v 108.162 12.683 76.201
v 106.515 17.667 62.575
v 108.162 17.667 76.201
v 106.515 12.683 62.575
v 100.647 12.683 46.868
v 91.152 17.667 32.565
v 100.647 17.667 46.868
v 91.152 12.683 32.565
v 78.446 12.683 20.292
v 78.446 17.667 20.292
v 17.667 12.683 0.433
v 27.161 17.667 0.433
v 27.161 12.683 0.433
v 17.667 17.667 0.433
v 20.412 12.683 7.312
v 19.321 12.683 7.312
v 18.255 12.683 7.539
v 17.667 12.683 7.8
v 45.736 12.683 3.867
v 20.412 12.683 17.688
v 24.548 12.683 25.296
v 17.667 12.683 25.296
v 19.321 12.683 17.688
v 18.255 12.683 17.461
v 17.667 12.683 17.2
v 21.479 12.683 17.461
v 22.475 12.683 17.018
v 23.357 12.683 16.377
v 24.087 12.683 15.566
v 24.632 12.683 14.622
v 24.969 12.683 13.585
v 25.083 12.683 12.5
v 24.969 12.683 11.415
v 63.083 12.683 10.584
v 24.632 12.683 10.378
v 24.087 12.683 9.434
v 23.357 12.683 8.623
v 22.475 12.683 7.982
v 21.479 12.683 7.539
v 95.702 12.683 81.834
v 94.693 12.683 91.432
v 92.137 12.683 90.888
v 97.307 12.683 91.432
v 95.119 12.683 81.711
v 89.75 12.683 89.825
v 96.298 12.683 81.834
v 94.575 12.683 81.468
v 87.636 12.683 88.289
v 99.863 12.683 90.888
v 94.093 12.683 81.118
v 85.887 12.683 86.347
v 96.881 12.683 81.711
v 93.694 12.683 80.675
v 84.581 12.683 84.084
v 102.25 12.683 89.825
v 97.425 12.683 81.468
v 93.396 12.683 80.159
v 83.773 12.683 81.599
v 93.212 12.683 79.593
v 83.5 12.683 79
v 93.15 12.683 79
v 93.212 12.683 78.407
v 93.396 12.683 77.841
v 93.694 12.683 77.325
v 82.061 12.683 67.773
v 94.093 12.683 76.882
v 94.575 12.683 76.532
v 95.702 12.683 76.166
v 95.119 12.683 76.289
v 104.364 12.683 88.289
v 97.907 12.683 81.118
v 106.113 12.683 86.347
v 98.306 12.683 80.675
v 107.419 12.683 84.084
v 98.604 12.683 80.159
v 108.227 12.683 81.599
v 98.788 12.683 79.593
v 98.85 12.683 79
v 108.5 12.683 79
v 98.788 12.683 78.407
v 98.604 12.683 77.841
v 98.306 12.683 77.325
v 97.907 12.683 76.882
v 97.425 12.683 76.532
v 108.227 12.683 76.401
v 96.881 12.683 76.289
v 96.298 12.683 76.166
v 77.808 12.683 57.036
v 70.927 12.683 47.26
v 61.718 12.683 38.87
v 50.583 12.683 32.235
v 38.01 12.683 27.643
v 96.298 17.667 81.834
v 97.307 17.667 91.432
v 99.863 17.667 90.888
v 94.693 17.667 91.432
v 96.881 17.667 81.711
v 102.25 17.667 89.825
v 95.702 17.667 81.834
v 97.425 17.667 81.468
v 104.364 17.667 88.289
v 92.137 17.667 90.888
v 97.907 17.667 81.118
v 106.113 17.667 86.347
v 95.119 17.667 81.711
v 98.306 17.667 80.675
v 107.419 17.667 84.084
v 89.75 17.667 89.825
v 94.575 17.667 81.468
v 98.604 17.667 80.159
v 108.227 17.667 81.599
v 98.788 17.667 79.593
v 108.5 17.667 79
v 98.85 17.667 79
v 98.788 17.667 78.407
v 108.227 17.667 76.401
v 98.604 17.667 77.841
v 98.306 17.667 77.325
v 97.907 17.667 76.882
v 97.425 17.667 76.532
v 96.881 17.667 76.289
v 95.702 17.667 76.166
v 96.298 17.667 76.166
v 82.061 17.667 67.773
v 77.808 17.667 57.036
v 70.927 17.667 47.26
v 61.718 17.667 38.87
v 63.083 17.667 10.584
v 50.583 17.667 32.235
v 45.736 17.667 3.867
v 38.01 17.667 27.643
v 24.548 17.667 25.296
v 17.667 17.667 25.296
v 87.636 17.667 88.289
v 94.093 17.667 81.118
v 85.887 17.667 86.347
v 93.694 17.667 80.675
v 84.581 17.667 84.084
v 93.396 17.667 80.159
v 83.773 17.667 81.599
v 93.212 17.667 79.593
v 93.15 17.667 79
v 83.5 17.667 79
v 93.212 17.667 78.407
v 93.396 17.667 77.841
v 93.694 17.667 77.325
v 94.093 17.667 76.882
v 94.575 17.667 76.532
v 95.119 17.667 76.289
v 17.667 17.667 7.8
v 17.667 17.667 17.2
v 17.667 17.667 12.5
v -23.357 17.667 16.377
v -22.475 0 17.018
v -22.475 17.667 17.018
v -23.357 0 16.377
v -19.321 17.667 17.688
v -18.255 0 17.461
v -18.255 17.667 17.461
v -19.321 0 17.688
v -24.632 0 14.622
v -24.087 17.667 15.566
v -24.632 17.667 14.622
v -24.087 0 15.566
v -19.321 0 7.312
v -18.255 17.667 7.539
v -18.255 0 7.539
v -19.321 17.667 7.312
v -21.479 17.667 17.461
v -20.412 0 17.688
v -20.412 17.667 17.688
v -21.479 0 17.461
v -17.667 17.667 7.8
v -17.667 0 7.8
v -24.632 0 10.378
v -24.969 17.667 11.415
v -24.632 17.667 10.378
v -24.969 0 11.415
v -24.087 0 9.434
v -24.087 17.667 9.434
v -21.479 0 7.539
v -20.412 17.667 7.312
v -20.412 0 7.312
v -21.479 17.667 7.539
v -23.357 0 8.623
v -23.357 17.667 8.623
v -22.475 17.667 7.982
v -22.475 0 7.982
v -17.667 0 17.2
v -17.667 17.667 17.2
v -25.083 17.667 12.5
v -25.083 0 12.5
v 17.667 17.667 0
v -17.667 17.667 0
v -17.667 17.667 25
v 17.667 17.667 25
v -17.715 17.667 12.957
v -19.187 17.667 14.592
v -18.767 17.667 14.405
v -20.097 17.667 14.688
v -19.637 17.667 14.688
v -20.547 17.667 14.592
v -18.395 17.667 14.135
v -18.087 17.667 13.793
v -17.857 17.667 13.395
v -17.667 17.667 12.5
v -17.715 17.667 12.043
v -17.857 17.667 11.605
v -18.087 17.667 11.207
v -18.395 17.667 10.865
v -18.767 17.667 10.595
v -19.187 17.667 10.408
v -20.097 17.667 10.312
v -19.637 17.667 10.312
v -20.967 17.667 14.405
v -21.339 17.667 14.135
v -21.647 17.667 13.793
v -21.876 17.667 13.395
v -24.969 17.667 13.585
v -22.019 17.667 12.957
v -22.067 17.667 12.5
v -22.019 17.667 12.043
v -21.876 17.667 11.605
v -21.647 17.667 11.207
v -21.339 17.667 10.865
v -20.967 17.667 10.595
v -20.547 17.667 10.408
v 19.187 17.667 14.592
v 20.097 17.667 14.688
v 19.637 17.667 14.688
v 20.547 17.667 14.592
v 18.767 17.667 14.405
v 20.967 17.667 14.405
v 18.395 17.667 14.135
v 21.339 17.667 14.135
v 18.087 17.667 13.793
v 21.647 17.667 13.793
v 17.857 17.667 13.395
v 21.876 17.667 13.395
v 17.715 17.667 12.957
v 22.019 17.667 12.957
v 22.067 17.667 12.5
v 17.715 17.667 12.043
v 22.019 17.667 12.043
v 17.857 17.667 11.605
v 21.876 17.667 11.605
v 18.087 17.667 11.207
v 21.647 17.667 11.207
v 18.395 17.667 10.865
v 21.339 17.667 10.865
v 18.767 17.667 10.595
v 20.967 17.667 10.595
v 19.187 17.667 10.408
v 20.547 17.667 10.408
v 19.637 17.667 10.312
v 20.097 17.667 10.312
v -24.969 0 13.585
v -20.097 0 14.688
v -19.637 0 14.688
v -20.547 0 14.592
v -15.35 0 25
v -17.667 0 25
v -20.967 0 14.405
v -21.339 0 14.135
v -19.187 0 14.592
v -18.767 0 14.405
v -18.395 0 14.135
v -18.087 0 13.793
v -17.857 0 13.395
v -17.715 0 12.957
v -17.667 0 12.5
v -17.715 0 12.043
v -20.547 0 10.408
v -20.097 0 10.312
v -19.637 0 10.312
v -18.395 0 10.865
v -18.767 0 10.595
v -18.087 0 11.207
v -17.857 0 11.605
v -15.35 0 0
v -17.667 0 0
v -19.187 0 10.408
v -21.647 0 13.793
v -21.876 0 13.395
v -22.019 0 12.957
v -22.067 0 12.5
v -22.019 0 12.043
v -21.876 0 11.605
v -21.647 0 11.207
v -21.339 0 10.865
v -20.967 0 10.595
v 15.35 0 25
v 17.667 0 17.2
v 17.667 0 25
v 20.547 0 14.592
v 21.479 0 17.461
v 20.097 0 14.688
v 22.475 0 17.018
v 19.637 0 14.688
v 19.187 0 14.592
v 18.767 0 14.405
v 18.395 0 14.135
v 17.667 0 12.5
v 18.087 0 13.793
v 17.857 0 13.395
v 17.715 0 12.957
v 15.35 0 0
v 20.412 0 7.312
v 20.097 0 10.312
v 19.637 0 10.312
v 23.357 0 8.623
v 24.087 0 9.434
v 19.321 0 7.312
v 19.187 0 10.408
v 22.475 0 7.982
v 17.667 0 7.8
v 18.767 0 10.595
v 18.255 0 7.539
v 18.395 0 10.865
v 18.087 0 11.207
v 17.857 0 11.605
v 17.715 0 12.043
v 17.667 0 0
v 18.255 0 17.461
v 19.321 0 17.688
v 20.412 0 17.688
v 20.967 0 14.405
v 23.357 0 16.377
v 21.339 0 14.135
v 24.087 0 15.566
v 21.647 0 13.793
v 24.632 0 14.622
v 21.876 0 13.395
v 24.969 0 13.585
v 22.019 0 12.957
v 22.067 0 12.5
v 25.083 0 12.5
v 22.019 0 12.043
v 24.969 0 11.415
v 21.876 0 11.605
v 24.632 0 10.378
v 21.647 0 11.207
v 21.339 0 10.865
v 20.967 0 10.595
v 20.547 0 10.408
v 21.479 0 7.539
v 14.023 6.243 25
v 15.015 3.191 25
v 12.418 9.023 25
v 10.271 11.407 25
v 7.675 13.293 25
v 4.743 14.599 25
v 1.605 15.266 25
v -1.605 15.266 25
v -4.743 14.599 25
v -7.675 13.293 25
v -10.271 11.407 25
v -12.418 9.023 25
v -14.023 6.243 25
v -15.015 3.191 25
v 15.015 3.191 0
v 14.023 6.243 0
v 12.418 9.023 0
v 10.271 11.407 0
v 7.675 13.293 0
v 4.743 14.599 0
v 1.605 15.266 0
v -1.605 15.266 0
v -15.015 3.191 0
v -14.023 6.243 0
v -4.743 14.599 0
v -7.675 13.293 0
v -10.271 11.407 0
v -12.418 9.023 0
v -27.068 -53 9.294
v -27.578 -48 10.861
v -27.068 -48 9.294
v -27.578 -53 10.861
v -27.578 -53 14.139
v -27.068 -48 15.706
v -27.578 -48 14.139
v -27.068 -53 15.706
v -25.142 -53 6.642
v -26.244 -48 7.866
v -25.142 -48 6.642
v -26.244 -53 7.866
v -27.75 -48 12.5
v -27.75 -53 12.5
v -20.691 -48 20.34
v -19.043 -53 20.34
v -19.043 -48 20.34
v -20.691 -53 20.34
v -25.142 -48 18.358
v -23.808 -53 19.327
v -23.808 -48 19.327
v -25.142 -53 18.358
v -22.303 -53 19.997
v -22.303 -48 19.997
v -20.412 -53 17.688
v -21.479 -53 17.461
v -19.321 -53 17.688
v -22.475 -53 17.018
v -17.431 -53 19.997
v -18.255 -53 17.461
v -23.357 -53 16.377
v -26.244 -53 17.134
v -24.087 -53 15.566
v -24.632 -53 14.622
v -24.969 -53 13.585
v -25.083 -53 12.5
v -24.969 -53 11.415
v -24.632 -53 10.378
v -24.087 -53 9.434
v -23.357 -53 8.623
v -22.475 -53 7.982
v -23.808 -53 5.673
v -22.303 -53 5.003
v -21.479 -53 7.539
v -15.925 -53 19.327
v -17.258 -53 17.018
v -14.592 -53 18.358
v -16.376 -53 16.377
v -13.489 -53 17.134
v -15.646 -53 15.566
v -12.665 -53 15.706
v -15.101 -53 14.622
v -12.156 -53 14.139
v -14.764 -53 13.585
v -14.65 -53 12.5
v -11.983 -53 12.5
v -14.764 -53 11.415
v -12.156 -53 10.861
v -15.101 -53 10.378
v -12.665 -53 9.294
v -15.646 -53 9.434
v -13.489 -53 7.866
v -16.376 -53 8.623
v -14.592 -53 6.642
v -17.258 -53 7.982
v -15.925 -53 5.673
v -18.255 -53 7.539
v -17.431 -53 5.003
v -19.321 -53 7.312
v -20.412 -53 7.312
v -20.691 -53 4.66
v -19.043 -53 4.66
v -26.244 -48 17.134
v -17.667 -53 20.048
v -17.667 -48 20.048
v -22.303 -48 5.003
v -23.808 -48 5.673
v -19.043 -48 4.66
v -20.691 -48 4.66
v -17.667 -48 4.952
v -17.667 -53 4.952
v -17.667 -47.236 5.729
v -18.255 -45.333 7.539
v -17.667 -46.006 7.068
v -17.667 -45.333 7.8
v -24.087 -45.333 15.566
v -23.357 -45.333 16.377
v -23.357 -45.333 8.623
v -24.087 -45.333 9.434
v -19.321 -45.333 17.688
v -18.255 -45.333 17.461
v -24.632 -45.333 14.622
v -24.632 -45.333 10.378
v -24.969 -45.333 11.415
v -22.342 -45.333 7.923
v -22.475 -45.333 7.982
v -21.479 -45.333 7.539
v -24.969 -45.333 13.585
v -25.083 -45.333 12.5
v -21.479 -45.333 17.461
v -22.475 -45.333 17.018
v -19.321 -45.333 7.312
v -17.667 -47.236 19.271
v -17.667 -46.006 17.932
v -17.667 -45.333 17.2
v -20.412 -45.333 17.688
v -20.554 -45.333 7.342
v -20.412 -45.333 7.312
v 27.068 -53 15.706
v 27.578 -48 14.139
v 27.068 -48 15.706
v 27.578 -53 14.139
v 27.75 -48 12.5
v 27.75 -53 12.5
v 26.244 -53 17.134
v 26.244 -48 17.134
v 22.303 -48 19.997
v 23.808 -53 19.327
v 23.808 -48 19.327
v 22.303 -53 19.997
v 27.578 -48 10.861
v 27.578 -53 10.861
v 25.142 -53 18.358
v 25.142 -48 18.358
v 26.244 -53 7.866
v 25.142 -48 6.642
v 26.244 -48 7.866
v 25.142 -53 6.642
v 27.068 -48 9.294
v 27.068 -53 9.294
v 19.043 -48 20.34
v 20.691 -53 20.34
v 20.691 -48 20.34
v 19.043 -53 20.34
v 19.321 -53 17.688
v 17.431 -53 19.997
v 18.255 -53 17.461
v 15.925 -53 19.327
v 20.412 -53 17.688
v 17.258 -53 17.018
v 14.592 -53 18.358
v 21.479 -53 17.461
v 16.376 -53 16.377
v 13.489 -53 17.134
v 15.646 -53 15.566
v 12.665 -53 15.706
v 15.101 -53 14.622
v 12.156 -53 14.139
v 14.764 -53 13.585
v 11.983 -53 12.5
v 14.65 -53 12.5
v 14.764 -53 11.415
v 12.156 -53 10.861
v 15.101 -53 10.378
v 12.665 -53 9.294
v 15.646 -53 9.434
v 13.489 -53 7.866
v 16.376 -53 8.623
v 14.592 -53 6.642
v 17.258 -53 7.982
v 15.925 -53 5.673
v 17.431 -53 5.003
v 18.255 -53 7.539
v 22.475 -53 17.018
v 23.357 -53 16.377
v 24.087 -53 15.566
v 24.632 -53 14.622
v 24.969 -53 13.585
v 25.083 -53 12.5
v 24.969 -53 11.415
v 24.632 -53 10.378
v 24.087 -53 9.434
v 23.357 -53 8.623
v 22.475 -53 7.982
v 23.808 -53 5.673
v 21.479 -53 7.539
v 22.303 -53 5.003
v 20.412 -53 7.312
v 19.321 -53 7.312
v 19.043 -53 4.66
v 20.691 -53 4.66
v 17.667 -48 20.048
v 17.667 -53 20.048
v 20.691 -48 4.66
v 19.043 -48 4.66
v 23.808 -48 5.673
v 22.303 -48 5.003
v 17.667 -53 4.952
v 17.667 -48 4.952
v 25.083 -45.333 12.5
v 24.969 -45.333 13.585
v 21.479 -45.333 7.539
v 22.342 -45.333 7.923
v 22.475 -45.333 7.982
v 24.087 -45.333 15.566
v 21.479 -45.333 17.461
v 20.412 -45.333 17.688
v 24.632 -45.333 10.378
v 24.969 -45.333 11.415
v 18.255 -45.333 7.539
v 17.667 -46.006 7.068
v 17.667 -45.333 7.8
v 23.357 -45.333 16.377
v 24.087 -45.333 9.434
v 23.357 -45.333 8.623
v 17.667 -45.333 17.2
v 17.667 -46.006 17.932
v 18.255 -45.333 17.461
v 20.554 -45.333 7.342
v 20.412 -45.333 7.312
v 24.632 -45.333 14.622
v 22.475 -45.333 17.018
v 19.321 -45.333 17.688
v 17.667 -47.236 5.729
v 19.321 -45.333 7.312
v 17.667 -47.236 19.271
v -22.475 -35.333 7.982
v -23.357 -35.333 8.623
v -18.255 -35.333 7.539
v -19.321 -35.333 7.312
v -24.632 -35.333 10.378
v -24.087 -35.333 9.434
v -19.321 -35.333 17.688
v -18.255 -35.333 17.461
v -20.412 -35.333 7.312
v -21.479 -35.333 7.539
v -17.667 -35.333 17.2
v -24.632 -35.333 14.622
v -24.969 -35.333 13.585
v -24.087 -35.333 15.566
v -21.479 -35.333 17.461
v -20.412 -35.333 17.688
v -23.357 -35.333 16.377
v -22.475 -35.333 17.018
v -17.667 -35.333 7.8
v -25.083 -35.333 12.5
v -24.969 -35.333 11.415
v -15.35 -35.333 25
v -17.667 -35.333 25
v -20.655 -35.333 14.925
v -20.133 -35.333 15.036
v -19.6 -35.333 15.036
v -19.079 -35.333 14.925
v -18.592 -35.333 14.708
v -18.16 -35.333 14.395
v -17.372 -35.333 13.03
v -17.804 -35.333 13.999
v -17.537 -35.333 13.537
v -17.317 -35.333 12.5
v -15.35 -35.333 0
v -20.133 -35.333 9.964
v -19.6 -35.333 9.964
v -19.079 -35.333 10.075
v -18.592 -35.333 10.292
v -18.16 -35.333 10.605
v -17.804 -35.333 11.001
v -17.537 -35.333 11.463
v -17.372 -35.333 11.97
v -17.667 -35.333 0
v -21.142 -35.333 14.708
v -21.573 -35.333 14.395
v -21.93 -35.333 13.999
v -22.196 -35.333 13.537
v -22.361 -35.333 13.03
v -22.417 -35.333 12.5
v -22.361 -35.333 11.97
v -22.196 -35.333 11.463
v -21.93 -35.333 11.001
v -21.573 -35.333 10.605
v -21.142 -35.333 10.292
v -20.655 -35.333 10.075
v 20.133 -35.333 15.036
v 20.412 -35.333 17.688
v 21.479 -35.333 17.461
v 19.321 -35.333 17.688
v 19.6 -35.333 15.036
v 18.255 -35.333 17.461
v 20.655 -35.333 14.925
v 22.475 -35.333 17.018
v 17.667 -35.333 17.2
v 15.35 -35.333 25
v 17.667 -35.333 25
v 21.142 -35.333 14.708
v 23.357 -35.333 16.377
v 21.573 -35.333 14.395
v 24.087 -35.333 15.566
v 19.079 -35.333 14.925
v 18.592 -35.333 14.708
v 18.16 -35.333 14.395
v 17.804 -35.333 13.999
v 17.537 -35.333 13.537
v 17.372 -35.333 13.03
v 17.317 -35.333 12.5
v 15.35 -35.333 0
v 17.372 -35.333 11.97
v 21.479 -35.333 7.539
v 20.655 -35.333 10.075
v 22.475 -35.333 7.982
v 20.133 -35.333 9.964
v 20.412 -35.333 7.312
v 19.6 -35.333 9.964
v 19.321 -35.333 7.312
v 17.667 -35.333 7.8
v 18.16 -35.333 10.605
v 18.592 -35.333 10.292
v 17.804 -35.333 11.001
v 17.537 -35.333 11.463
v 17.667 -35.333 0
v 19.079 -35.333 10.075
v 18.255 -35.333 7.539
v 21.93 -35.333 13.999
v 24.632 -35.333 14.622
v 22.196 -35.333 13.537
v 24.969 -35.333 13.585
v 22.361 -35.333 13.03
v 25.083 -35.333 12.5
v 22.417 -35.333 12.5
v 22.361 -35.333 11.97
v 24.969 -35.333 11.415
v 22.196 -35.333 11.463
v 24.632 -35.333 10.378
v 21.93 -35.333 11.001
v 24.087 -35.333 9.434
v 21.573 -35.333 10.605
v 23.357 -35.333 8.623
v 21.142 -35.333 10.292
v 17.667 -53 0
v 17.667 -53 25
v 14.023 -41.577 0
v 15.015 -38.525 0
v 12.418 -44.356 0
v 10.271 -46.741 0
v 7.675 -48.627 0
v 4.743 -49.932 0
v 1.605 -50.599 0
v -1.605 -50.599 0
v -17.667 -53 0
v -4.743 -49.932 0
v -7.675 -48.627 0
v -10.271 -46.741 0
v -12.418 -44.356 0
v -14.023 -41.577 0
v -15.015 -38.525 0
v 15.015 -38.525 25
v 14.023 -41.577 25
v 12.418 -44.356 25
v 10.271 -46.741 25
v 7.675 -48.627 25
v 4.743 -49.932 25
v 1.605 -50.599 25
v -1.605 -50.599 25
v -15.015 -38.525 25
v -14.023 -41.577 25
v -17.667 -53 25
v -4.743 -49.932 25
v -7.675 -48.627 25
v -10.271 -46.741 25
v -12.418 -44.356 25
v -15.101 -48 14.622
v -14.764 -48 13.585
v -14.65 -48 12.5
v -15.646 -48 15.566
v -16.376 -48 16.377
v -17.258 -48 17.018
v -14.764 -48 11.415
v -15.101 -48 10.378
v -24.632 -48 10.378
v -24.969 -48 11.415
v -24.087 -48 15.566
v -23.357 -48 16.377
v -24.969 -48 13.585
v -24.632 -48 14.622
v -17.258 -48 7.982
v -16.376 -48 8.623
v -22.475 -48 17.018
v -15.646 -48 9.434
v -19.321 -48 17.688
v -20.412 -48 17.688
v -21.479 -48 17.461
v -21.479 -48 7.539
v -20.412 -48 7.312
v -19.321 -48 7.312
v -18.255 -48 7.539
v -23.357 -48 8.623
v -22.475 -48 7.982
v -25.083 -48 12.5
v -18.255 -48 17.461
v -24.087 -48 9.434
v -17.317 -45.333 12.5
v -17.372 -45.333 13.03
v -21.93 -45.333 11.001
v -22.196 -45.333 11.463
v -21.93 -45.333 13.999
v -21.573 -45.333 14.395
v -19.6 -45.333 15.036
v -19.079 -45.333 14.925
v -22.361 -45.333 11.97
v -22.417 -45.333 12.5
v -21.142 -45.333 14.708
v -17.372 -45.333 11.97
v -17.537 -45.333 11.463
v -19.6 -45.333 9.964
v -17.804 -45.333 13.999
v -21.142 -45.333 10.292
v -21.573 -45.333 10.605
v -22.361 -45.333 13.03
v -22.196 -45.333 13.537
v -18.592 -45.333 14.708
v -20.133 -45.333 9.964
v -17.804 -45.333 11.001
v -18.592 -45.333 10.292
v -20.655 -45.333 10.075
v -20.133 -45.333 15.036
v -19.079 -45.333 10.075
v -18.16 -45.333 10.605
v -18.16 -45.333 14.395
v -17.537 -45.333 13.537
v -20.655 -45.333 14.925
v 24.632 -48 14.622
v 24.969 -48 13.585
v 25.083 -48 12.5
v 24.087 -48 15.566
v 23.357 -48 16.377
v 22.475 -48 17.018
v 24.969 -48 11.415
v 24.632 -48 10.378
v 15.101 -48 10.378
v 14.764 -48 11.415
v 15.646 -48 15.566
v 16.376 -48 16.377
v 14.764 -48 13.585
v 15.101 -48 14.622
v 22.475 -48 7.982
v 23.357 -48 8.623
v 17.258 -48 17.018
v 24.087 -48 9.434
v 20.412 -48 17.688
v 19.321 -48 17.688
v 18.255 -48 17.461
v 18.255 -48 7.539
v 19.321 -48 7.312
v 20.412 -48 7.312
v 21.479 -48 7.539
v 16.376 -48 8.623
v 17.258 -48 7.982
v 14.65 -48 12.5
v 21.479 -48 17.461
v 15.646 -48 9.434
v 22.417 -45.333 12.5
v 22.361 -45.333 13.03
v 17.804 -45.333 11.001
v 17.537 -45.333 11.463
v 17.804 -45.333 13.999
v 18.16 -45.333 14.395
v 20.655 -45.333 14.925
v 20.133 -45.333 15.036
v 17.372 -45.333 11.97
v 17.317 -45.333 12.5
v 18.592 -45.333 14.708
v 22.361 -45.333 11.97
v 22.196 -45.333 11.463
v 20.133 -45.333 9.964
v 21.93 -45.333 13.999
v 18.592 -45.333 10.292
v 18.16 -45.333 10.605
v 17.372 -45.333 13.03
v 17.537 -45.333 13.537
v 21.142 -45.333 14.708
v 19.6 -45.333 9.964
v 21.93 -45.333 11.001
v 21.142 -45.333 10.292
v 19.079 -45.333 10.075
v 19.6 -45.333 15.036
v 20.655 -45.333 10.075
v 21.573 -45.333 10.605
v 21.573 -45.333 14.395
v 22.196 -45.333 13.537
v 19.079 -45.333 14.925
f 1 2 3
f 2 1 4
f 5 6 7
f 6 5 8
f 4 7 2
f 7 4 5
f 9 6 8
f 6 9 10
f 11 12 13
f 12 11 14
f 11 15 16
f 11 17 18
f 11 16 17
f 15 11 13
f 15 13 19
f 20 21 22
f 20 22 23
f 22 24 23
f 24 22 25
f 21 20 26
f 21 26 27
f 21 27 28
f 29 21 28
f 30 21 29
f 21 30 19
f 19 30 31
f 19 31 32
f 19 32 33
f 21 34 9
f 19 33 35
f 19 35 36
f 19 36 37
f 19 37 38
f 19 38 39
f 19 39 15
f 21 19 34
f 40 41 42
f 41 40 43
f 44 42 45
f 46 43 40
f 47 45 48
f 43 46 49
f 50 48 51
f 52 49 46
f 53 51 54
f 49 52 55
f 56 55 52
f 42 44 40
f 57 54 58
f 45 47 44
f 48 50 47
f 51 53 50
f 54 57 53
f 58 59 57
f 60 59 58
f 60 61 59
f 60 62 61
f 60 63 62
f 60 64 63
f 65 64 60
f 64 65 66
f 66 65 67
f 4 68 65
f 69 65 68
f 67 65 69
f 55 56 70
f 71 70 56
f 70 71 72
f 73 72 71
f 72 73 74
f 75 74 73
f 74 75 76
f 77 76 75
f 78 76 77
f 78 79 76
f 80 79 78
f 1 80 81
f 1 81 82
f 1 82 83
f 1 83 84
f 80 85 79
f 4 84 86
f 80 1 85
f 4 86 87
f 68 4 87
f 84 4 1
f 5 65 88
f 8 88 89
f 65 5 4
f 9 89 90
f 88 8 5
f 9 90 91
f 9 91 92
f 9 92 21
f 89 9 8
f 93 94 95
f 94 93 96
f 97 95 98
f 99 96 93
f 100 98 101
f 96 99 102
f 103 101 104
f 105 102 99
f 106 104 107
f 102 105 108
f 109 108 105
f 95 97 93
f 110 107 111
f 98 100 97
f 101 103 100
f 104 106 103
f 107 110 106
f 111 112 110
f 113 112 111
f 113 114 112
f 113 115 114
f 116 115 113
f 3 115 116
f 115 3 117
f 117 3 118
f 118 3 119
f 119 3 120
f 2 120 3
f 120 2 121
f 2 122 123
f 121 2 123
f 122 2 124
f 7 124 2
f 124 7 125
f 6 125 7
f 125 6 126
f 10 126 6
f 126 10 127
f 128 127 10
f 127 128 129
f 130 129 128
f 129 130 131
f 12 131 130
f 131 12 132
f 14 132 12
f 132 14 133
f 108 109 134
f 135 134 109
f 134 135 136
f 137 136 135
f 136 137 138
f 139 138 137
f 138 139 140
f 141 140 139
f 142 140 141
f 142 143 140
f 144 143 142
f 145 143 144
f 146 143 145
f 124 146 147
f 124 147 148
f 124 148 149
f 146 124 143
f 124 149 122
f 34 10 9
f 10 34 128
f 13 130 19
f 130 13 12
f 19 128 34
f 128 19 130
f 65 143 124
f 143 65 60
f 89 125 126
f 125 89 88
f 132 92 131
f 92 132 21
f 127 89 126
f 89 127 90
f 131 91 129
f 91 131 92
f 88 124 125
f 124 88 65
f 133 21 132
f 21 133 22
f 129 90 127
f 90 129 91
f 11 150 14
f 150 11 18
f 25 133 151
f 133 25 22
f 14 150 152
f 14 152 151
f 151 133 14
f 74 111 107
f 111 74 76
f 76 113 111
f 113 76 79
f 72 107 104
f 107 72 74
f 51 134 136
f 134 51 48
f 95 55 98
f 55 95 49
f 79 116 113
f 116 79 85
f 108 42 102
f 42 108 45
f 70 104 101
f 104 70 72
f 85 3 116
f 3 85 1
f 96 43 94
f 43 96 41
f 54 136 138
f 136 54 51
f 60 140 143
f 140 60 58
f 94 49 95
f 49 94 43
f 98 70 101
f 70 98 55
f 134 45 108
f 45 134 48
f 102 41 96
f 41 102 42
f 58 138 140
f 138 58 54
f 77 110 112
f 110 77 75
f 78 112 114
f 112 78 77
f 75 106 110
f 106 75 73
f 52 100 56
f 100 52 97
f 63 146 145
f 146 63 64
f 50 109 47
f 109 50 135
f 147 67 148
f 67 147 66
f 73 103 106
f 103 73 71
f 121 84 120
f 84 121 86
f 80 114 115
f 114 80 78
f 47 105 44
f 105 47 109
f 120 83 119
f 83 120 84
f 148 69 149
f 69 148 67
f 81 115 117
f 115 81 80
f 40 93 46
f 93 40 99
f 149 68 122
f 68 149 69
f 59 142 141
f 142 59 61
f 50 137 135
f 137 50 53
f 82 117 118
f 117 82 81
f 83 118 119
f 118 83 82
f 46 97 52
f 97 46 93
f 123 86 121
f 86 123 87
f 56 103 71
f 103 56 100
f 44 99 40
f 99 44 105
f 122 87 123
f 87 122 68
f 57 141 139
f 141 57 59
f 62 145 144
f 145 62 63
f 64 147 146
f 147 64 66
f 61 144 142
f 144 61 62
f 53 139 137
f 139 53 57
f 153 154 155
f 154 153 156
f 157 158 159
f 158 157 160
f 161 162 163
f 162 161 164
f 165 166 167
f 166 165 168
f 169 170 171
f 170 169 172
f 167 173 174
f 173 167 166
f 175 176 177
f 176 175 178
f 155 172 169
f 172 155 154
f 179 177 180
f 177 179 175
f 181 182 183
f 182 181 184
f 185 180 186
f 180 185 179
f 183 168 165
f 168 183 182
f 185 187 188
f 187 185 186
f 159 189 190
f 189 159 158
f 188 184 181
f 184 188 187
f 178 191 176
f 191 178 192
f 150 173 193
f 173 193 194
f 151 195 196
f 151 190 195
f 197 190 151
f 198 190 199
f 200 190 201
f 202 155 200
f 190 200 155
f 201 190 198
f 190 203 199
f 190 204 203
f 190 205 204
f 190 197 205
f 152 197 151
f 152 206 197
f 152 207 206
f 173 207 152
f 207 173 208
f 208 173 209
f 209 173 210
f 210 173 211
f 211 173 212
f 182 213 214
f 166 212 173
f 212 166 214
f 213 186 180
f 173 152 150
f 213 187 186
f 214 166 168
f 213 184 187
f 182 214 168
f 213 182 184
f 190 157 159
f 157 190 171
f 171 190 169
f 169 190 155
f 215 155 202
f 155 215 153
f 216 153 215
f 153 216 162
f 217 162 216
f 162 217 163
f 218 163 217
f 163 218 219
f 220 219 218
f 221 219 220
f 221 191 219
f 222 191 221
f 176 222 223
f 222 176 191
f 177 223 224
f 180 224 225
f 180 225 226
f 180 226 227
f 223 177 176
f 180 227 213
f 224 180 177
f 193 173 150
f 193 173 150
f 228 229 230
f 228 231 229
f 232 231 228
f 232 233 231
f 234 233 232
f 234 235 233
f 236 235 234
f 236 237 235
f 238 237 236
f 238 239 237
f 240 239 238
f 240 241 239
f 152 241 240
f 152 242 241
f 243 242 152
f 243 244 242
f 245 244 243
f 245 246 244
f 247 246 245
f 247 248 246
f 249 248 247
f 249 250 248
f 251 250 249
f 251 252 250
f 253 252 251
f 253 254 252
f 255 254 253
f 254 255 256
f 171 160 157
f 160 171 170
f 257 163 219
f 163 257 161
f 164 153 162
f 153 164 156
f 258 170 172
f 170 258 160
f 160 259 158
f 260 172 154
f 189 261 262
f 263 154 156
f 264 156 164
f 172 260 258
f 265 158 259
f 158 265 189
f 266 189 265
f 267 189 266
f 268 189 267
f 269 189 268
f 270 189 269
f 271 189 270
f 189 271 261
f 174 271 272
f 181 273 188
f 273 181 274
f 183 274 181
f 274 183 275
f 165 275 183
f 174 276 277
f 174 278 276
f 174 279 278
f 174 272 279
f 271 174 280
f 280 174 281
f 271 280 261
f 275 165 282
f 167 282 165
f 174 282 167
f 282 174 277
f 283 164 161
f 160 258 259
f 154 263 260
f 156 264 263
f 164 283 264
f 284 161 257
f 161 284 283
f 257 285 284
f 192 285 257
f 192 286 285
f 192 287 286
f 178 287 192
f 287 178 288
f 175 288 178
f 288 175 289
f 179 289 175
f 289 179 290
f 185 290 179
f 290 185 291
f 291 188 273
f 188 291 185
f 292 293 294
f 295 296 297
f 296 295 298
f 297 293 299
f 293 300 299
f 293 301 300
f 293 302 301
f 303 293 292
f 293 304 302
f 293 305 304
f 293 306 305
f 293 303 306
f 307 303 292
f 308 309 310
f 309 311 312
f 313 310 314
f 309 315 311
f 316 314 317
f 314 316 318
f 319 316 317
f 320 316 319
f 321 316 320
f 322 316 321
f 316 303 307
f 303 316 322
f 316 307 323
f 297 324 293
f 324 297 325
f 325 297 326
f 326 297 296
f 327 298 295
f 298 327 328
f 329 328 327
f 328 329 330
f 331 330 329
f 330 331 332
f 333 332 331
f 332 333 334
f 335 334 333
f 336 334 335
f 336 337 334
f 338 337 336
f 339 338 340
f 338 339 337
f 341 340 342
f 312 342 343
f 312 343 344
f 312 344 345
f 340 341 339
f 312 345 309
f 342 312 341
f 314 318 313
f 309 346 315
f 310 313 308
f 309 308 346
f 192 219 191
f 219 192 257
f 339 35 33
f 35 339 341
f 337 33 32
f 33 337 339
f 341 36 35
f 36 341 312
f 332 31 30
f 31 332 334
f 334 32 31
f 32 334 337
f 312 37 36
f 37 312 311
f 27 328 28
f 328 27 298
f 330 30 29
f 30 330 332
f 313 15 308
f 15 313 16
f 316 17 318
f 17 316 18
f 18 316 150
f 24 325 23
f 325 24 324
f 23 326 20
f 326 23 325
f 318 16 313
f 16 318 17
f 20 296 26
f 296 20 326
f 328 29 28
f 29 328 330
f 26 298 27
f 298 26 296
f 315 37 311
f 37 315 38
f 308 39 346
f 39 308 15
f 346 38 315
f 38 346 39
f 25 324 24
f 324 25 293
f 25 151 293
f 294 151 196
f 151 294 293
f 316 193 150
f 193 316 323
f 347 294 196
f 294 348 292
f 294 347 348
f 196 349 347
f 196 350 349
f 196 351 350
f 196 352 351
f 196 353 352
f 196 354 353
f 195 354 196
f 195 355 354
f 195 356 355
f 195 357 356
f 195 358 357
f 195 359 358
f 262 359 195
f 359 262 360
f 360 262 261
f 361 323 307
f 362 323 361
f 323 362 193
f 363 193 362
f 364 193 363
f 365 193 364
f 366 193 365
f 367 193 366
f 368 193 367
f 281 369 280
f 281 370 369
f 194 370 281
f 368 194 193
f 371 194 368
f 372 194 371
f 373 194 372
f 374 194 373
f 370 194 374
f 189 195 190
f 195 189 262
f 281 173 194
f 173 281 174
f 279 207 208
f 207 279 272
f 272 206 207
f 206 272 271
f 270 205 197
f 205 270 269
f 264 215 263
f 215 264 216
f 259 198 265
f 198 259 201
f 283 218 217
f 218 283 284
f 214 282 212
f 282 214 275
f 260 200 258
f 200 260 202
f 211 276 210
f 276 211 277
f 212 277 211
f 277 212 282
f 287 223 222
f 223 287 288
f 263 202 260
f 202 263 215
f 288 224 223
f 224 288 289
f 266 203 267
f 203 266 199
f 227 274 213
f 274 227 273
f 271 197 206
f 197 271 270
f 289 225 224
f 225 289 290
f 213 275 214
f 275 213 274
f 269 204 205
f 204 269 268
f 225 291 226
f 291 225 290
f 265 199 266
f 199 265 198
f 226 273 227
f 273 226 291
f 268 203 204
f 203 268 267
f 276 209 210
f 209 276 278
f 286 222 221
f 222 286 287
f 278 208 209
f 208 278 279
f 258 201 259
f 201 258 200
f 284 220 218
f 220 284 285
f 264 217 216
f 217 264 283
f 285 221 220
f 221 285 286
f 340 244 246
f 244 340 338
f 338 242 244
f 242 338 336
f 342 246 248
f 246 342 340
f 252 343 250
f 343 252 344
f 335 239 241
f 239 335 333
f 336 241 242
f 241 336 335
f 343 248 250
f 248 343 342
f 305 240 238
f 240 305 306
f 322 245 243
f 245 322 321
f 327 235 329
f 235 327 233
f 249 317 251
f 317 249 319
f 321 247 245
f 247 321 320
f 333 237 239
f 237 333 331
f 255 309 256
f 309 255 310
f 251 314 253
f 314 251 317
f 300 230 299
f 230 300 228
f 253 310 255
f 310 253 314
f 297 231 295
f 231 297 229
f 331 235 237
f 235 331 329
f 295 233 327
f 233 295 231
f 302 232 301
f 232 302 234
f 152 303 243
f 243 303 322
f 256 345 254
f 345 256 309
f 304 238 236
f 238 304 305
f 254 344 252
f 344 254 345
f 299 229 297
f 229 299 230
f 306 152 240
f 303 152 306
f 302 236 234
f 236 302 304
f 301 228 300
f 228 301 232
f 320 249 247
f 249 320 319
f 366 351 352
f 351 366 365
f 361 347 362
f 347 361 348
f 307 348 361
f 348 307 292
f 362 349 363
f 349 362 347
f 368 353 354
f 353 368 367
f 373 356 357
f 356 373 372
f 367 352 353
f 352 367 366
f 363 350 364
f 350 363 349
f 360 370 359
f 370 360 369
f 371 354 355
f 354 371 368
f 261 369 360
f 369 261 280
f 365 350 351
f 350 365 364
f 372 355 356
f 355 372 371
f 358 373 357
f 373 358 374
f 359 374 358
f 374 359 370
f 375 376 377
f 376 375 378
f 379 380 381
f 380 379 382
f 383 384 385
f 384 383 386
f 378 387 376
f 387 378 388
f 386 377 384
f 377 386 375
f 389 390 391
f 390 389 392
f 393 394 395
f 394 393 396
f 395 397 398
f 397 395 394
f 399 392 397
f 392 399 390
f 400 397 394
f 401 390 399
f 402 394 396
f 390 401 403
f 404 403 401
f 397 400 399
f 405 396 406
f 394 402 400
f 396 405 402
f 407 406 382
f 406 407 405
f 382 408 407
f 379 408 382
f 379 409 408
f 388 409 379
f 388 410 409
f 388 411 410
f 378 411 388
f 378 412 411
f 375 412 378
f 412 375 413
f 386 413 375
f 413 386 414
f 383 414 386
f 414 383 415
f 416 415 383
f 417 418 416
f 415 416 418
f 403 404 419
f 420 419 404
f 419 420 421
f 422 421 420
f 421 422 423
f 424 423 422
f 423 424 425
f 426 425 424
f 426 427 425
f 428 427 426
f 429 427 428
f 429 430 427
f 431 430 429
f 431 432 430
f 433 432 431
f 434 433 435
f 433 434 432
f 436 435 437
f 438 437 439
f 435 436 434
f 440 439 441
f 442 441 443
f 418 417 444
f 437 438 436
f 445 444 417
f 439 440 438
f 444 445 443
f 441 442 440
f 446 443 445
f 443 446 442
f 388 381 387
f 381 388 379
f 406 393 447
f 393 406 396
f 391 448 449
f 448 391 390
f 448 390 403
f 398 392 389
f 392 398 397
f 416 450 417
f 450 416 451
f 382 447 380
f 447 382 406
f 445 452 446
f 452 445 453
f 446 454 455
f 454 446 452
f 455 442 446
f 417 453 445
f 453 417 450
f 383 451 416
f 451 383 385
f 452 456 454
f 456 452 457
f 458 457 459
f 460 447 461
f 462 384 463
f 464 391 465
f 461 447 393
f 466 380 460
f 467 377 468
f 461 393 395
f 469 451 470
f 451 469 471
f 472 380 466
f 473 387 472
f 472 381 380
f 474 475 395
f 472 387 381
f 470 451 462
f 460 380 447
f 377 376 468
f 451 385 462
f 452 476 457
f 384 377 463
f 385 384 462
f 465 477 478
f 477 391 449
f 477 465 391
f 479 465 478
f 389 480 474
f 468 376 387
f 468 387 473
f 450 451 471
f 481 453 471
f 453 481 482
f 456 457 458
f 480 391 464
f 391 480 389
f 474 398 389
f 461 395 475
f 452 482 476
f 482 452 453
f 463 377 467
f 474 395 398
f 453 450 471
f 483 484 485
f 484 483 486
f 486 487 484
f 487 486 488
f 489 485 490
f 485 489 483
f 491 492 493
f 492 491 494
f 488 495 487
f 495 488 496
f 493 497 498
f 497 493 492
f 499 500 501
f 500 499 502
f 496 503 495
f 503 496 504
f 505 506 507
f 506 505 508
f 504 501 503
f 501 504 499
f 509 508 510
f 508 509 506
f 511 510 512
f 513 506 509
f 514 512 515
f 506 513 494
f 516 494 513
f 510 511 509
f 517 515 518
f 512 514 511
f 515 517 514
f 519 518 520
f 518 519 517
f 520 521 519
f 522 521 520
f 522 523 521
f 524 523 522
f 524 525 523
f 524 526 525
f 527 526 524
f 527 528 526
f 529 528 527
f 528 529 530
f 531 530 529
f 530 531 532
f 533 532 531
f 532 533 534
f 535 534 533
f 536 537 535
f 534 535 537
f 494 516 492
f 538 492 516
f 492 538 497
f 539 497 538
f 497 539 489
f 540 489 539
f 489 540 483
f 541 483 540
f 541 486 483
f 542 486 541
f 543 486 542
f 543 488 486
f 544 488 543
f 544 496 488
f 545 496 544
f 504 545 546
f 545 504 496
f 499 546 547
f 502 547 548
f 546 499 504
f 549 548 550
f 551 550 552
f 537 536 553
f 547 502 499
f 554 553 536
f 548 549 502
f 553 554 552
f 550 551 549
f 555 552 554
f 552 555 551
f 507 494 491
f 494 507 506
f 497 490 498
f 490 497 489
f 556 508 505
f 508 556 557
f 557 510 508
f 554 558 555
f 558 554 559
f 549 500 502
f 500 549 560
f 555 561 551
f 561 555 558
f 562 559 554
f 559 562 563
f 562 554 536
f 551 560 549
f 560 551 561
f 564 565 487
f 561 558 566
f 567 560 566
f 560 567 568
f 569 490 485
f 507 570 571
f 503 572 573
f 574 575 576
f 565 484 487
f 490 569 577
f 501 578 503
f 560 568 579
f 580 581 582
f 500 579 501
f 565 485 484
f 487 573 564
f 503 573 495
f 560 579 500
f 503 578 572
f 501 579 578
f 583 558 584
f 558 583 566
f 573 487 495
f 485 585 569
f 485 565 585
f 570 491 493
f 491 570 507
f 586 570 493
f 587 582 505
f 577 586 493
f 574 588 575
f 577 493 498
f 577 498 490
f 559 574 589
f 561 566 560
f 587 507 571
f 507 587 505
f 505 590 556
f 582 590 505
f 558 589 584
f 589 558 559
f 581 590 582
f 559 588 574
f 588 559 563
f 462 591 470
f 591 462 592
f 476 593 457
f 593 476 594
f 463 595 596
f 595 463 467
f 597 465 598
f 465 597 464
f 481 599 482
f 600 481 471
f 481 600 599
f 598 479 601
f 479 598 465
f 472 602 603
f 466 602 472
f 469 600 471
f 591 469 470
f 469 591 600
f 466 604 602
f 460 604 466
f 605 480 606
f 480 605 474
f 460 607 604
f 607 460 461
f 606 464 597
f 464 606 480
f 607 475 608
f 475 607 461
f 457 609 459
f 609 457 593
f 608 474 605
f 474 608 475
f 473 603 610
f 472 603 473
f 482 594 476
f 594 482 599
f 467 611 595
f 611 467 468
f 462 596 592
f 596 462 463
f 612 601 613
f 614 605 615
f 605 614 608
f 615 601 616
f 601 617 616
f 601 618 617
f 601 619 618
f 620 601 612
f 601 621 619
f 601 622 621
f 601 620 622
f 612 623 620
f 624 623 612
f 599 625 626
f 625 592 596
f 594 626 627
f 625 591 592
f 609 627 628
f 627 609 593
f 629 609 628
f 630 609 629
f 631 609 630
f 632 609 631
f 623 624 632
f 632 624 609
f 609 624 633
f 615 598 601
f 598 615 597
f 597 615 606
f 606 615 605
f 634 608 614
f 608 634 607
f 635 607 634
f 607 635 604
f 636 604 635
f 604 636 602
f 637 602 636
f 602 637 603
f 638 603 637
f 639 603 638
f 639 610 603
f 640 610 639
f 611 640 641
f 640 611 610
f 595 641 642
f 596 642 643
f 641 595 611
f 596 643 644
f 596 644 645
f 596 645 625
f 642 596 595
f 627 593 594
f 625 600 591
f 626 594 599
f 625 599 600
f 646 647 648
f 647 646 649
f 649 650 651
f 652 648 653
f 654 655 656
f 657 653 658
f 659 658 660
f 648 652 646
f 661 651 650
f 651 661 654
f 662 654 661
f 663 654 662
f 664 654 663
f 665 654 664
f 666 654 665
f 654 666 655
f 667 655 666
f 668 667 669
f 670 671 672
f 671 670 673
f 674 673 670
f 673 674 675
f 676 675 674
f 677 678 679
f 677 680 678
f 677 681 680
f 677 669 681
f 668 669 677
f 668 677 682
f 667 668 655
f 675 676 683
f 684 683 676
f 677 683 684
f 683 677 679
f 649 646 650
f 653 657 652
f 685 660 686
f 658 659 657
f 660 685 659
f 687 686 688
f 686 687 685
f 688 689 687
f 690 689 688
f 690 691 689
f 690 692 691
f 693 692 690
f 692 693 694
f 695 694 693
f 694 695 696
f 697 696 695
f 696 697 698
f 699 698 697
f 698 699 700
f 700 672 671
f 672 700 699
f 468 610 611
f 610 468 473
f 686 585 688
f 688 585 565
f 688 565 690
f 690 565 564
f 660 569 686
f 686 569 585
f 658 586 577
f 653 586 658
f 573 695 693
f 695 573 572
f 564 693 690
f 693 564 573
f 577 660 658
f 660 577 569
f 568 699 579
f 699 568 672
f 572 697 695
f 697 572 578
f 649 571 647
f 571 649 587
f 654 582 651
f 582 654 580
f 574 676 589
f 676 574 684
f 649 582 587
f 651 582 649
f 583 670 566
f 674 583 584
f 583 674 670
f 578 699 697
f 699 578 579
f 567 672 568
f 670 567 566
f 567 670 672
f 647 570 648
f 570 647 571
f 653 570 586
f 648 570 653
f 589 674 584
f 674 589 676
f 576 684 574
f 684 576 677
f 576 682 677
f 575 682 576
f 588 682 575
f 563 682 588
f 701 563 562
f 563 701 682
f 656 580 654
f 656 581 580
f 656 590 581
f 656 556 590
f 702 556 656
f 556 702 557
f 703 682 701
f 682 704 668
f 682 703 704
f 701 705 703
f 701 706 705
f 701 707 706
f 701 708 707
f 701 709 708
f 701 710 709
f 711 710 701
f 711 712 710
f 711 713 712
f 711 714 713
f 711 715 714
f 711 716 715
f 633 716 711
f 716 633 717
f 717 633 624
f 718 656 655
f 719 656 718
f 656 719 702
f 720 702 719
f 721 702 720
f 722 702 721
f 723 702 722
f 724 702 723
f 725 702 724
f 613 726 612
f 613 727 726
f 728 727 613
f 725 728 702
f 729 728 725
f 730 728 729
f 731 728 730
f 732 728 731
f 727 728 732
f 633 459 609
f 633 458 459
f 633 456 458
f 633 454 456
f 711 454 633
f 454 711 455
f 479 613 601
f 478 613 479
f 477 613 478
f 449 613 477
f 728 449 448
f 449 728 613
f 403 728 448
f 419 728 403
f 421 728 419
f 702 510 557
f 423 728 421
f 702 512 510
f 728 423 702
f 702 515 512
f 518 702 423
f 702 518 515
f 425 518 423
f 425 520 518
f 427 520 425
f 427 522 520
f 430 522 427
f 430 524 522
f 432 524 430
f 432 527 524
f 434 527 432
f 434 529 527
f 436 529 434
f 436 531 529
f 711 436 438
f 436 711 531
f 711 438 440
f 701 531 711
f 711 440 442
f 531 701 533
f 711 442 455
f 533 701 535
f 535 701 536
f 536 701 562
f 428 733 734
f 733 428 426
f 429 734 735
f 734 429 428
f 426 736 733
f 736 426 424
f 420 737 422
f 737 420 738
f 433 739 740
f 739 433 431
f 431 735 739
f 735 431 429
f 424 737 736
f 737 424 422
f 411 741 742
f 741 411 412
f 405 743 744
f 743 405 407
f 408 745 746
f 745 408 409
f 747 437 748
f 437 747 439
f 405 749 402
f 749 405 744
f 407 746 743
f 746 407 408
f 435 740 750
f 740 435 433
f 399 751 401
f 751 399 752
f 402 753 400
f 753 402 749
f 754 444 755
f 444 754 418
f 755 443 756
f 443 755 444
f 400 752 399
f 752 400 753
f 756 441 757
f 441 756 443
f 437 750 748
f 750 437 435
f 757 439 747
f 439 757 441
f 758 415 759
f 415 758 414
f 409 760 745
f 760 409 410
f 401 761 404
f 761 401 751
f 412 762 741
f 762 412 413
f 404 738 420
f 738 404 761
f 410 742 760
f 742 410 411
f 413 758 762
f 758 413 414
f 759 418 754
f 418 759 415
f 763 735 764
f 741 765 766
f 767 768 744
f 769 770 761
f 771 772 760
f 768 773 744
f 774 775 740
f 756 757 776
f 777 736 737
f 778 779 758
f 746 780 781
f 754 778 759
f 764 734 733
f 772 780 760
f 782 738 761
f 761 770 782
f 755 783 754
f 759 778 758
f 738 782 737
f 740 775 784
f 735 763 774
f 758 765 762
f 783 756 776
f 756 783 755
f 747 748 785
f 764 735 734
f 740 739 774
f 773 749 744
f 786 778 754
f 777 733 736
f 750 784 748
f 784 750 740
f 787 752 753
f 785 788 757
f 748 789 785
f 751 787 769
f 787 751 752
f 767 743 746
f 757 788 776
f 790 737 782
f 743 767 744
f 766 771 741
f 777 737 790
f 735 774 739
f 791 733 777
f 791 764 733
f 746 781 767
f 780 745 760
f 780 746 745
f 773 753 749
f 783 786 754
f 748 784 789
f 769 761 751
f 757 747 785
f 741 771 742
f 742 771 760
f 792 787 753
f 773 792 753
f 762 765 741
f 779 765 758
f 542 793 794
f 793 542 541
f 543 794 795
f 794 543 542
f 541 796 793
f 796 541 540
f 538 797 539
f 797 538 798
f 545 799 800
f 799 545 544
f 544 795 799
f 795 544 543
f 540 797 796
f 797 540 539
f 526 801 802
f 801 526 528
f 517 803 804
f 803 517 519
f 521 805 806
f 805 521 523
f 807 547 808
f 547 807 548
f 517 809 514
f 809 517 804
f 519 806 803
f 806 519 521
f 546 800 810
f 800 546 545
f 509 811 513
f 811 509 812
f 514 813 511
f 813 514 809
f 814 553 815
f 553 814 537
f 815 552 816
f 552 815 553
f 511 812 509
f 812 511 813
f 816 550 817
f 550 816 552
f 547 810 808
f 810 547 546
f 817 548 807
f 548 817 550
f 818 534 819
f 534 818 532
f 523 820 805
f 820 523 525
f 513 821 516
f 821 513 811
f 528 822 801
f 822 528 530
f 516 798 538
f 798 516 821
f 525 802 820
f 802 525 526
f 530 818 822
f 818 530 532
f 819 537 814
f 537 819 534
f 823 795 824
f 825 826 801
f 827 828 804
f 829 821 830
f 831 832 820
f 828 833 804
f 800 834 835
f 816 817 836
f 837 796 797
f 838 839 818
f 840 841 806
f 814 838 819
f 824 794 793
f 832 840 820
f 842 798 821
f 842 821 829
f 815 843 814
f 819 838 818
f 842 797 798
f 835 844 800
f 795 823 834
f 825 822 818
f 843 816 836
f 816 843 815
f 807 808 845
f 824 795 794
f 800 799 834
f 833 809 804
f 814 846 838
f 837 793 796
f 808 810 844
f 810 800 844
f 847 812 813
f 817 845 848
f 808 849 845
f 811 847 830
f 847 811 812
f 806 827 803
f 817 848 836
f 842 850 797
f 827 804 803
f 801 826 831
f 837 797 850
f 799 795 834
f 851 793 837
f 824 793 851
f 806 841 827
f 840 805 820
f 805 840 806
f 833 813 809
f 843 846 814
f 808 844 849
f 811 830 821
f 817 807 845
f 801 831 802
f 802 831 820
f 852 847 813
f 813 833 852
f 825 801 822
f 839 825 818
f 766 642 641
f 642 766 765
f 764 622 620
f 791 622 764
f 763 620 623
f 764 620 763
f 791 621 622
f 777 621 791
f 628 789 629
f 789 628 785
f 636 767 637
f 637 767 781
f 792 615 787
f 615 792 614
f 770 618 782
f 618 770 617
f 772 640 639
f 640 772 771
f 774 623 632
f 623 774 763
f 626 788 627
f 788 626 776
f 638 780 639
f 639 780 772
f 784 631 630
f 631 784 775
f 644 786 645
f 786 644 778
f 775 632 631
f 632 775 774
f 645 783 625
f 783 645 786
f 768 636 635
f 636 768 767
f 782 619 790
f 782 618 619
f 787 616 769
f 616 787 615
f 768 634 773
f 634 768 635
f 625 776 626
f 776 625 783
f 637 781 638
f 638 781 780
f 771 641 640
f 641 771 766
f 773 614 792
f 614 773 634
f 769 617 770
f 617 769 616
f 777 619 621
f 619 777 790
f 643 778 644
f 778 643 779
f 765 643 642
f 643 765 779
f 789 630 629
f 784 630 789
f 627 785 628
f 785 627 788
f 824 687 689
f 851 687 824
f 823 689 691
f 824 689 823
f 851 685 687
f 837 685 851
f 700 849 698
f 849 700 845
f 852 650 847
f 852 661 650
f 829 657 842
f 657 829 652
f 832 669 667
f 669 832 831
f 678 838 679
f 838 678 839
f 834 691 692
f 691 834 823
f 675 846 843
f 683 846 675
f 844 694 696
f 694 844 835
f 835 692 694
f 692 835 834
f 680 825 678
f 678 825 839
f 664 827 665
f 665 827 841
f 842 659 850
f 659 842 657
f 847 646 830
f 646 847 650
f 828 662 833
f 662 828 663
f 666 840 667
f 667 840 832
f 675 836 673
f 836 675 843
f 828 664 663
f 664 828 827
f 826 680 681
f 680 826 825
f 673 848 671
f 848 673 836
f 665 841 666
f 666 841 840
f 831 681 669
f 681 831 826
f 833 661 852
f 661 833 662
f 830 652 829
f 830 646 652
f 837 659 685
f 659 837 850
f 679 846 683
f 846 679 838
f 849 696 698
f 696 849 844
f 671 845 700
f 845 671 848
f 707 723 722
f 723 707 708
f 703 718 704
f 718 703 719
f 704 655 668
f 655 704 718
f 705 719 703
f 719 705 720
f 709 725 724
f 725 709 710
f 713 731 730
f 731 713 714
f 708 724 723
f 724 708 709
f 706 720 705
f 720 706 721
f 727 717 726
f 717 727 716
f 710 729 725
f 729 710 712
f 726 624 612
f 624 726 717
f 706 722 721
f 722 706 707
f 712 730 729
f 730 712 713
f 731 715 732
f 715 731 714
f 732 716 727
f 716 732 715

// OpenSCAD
/**
 * Copyright 2021 Nathan Fairhurst.
 */
module mount(
  depth,
  thickness,
  inner_radius,
  screw_distance,
  screw_offset,
  screw_radius,
  clasp_screw_minor_radius,
  clasp_screw_major_radius,
  clasp_screw_inset,
  component = "ALL",
  explode, // only valid when "ALL" is selected
) {
  outer_radius = thickness + inner_radius;
  true_inner_radius = inner_radius + $tolerance/2;
  effective_explode = component == "ALL"
    ? explode == undef
      ? depth + thickness * 2 + 5
      : explode
    : 0;

  module tube_clasp(has_arm) {
    // TODO: Currently the distance between screws is set based on the minor
    // radius, but this means that the cutouts for the major radius leave less
    // that one thickness worth of material.  Instead, distances would be set
    // to the _major_ radius.
    clasp_screw_radius = has_arm
      ? clasp_screw_minor_radius
      : clasp_screw_major_radius;

    difference() {
      union() {
        if (has_arm)
        translate([outer_radius, true_inner_radius+thickness-$tolerance/2, screw_offset + depth])
        rotate([90, 0, 0])
        difference() {
          union() {
            intersection() {
              translate([0, -screw_offset-depth, 0])
                cube([screw_distance + depth/2 - outer_radius, screw_offset + depth, 2*thickness - $tolerance/2]);
              difference() {
                scale([screw_distance + depth/2 - outer_radius, screw_offset + depth, 1])
                  cylinder(2*thickness - $tolerance/2, 1, 1);
                translate([0, 0, -$tolerance/4])
                  scale([screw_distance - depth/2 - outer_radius, screw_offset, 1])
                    cylinder(2*thickness, 1, 1);
              }
            }
            translate([screw_distance - outer_radius, 0, 0])
              cylinder(2*thickness - $tolerance/2, depth/2, depth/2);
          }
          translate([screw_distance - outer_radius, 0, -$tolerance/2])
            cylinder(2 * thickness + $tolerance, screw_radius + $tolerance/2, screw_radius + $tolerance/2);
        }

        translate([-outer_radius, 0, 0])
          cube([outer_radius*2, outer_radius, depth]);
        for (i = [-1,1]) {
          translate([i*(thickness + inner_radius + clasp_screw_minor_radius), 0, depth/2])
            rotate([270, 0, 0])
              cylinder(outer_radius, thickness + clasp_screw_major_radius, thickness + clasp_screw_major_radius);
          if (!has_arm)
            translate([i*(thickness + inner_radius + clasp_screw_minor_radius), outer_radius - thickness - clasp_screw_inset, depth/2])
              rotate([270, 0, 0]) {
                translate([0, 0, thickness])
                  cylinder(clasp_screw_inset, thickness + clasp_screw_radius + thickness, thickness + clasp_screw_radius + thickness);
                cylinder(thickness, thickness + clasp_screw_radius, thickness + clasp_screw_radius + thickness);
              }
        }
      }
      translate([0, 0, -$tolerance/2])
        cylinder(depth + $tolerance, true_inner_radius, true_inner_radius);
      for (i = [-1,1]) {
        translate([i * (inner_radius + thickness + clasp_screw_minor_radius), 0, depth/2])
          rotate([-90, 0, 0])
            cylinder(outer_radius, clasp_screw_radius, clasp_screw_radius);
        if (!has_arm)
          translate([i * (inner_radius + thickness + clasp_screw_minor_radius), outer_radius - thickness - clasp_screw_inset, depth/2])
            rotate([270, 0, 0]) {
              translate([0, 0, thickness])
                cylinder(clasp_screw_inset, clasp_screw_radius + thickness, clasp_screw_radius + thickness);
              cylinder(thickness, clasp_screw_radius, clasp_screw_radius + thickness);
            }
      }
    }
  }

  if (component == "ALL" || component == "TOP_TUBE")
    tube_clasp(true);

  if (component == "BOTTOM_TUBE")
    tube_clasp(false);

  if (component == "ALL")
    translate([0, -effective_explode, depth])
      rotate([180, 0, 0])
        tube_clasp(false);

}



module sided_mount(
  depth,
  thickness,
  inner_radius,
  screw_radius,
  clasp_screw_minor_radius,
  clasp_screw_major_radius,
  clasp_screw_inset,
  component = "LEFT",
  explode
) {
  is_left =
    component == "LEFT_TOP_TUBE" ||
    component == "LEFT_BOTTOM_TUBE" ||
    component == "LEFT";

  subcomponent =
    component == "LEFT" || component == "RIGHT"
      ? "ALL" :
    component == "LEFT_TOP_TUBE" || component == "RIGHT_TOP_TUBE"
      ?  "TOP_TUBE" :
    component == "LEFT_BOTTOM_TUBE" || component == "RIGHT_BOTTOM_TUBE"
      ? "BOTTOM_TUBE"
      : component;

  mount(
    depth,
    thickness,
    inner_radius,
    is_left ? 96 : 45,
    is_left ? 54 : 27.5,
    screw_radius,
    clasp_screw_minor_radius,
    clasp_screw_major_radius,
    clasp_screw_inset,
    subcomponent,
    explode
  );
}

sided_mount(
  25,
  8/3,
  15,
  2.5,
  2.2, // TODO: Ideally this is affected by $tolerance in a reliable way??
  2.55,
  5,
  $fn=30,
  $tolerance=0.7
);
